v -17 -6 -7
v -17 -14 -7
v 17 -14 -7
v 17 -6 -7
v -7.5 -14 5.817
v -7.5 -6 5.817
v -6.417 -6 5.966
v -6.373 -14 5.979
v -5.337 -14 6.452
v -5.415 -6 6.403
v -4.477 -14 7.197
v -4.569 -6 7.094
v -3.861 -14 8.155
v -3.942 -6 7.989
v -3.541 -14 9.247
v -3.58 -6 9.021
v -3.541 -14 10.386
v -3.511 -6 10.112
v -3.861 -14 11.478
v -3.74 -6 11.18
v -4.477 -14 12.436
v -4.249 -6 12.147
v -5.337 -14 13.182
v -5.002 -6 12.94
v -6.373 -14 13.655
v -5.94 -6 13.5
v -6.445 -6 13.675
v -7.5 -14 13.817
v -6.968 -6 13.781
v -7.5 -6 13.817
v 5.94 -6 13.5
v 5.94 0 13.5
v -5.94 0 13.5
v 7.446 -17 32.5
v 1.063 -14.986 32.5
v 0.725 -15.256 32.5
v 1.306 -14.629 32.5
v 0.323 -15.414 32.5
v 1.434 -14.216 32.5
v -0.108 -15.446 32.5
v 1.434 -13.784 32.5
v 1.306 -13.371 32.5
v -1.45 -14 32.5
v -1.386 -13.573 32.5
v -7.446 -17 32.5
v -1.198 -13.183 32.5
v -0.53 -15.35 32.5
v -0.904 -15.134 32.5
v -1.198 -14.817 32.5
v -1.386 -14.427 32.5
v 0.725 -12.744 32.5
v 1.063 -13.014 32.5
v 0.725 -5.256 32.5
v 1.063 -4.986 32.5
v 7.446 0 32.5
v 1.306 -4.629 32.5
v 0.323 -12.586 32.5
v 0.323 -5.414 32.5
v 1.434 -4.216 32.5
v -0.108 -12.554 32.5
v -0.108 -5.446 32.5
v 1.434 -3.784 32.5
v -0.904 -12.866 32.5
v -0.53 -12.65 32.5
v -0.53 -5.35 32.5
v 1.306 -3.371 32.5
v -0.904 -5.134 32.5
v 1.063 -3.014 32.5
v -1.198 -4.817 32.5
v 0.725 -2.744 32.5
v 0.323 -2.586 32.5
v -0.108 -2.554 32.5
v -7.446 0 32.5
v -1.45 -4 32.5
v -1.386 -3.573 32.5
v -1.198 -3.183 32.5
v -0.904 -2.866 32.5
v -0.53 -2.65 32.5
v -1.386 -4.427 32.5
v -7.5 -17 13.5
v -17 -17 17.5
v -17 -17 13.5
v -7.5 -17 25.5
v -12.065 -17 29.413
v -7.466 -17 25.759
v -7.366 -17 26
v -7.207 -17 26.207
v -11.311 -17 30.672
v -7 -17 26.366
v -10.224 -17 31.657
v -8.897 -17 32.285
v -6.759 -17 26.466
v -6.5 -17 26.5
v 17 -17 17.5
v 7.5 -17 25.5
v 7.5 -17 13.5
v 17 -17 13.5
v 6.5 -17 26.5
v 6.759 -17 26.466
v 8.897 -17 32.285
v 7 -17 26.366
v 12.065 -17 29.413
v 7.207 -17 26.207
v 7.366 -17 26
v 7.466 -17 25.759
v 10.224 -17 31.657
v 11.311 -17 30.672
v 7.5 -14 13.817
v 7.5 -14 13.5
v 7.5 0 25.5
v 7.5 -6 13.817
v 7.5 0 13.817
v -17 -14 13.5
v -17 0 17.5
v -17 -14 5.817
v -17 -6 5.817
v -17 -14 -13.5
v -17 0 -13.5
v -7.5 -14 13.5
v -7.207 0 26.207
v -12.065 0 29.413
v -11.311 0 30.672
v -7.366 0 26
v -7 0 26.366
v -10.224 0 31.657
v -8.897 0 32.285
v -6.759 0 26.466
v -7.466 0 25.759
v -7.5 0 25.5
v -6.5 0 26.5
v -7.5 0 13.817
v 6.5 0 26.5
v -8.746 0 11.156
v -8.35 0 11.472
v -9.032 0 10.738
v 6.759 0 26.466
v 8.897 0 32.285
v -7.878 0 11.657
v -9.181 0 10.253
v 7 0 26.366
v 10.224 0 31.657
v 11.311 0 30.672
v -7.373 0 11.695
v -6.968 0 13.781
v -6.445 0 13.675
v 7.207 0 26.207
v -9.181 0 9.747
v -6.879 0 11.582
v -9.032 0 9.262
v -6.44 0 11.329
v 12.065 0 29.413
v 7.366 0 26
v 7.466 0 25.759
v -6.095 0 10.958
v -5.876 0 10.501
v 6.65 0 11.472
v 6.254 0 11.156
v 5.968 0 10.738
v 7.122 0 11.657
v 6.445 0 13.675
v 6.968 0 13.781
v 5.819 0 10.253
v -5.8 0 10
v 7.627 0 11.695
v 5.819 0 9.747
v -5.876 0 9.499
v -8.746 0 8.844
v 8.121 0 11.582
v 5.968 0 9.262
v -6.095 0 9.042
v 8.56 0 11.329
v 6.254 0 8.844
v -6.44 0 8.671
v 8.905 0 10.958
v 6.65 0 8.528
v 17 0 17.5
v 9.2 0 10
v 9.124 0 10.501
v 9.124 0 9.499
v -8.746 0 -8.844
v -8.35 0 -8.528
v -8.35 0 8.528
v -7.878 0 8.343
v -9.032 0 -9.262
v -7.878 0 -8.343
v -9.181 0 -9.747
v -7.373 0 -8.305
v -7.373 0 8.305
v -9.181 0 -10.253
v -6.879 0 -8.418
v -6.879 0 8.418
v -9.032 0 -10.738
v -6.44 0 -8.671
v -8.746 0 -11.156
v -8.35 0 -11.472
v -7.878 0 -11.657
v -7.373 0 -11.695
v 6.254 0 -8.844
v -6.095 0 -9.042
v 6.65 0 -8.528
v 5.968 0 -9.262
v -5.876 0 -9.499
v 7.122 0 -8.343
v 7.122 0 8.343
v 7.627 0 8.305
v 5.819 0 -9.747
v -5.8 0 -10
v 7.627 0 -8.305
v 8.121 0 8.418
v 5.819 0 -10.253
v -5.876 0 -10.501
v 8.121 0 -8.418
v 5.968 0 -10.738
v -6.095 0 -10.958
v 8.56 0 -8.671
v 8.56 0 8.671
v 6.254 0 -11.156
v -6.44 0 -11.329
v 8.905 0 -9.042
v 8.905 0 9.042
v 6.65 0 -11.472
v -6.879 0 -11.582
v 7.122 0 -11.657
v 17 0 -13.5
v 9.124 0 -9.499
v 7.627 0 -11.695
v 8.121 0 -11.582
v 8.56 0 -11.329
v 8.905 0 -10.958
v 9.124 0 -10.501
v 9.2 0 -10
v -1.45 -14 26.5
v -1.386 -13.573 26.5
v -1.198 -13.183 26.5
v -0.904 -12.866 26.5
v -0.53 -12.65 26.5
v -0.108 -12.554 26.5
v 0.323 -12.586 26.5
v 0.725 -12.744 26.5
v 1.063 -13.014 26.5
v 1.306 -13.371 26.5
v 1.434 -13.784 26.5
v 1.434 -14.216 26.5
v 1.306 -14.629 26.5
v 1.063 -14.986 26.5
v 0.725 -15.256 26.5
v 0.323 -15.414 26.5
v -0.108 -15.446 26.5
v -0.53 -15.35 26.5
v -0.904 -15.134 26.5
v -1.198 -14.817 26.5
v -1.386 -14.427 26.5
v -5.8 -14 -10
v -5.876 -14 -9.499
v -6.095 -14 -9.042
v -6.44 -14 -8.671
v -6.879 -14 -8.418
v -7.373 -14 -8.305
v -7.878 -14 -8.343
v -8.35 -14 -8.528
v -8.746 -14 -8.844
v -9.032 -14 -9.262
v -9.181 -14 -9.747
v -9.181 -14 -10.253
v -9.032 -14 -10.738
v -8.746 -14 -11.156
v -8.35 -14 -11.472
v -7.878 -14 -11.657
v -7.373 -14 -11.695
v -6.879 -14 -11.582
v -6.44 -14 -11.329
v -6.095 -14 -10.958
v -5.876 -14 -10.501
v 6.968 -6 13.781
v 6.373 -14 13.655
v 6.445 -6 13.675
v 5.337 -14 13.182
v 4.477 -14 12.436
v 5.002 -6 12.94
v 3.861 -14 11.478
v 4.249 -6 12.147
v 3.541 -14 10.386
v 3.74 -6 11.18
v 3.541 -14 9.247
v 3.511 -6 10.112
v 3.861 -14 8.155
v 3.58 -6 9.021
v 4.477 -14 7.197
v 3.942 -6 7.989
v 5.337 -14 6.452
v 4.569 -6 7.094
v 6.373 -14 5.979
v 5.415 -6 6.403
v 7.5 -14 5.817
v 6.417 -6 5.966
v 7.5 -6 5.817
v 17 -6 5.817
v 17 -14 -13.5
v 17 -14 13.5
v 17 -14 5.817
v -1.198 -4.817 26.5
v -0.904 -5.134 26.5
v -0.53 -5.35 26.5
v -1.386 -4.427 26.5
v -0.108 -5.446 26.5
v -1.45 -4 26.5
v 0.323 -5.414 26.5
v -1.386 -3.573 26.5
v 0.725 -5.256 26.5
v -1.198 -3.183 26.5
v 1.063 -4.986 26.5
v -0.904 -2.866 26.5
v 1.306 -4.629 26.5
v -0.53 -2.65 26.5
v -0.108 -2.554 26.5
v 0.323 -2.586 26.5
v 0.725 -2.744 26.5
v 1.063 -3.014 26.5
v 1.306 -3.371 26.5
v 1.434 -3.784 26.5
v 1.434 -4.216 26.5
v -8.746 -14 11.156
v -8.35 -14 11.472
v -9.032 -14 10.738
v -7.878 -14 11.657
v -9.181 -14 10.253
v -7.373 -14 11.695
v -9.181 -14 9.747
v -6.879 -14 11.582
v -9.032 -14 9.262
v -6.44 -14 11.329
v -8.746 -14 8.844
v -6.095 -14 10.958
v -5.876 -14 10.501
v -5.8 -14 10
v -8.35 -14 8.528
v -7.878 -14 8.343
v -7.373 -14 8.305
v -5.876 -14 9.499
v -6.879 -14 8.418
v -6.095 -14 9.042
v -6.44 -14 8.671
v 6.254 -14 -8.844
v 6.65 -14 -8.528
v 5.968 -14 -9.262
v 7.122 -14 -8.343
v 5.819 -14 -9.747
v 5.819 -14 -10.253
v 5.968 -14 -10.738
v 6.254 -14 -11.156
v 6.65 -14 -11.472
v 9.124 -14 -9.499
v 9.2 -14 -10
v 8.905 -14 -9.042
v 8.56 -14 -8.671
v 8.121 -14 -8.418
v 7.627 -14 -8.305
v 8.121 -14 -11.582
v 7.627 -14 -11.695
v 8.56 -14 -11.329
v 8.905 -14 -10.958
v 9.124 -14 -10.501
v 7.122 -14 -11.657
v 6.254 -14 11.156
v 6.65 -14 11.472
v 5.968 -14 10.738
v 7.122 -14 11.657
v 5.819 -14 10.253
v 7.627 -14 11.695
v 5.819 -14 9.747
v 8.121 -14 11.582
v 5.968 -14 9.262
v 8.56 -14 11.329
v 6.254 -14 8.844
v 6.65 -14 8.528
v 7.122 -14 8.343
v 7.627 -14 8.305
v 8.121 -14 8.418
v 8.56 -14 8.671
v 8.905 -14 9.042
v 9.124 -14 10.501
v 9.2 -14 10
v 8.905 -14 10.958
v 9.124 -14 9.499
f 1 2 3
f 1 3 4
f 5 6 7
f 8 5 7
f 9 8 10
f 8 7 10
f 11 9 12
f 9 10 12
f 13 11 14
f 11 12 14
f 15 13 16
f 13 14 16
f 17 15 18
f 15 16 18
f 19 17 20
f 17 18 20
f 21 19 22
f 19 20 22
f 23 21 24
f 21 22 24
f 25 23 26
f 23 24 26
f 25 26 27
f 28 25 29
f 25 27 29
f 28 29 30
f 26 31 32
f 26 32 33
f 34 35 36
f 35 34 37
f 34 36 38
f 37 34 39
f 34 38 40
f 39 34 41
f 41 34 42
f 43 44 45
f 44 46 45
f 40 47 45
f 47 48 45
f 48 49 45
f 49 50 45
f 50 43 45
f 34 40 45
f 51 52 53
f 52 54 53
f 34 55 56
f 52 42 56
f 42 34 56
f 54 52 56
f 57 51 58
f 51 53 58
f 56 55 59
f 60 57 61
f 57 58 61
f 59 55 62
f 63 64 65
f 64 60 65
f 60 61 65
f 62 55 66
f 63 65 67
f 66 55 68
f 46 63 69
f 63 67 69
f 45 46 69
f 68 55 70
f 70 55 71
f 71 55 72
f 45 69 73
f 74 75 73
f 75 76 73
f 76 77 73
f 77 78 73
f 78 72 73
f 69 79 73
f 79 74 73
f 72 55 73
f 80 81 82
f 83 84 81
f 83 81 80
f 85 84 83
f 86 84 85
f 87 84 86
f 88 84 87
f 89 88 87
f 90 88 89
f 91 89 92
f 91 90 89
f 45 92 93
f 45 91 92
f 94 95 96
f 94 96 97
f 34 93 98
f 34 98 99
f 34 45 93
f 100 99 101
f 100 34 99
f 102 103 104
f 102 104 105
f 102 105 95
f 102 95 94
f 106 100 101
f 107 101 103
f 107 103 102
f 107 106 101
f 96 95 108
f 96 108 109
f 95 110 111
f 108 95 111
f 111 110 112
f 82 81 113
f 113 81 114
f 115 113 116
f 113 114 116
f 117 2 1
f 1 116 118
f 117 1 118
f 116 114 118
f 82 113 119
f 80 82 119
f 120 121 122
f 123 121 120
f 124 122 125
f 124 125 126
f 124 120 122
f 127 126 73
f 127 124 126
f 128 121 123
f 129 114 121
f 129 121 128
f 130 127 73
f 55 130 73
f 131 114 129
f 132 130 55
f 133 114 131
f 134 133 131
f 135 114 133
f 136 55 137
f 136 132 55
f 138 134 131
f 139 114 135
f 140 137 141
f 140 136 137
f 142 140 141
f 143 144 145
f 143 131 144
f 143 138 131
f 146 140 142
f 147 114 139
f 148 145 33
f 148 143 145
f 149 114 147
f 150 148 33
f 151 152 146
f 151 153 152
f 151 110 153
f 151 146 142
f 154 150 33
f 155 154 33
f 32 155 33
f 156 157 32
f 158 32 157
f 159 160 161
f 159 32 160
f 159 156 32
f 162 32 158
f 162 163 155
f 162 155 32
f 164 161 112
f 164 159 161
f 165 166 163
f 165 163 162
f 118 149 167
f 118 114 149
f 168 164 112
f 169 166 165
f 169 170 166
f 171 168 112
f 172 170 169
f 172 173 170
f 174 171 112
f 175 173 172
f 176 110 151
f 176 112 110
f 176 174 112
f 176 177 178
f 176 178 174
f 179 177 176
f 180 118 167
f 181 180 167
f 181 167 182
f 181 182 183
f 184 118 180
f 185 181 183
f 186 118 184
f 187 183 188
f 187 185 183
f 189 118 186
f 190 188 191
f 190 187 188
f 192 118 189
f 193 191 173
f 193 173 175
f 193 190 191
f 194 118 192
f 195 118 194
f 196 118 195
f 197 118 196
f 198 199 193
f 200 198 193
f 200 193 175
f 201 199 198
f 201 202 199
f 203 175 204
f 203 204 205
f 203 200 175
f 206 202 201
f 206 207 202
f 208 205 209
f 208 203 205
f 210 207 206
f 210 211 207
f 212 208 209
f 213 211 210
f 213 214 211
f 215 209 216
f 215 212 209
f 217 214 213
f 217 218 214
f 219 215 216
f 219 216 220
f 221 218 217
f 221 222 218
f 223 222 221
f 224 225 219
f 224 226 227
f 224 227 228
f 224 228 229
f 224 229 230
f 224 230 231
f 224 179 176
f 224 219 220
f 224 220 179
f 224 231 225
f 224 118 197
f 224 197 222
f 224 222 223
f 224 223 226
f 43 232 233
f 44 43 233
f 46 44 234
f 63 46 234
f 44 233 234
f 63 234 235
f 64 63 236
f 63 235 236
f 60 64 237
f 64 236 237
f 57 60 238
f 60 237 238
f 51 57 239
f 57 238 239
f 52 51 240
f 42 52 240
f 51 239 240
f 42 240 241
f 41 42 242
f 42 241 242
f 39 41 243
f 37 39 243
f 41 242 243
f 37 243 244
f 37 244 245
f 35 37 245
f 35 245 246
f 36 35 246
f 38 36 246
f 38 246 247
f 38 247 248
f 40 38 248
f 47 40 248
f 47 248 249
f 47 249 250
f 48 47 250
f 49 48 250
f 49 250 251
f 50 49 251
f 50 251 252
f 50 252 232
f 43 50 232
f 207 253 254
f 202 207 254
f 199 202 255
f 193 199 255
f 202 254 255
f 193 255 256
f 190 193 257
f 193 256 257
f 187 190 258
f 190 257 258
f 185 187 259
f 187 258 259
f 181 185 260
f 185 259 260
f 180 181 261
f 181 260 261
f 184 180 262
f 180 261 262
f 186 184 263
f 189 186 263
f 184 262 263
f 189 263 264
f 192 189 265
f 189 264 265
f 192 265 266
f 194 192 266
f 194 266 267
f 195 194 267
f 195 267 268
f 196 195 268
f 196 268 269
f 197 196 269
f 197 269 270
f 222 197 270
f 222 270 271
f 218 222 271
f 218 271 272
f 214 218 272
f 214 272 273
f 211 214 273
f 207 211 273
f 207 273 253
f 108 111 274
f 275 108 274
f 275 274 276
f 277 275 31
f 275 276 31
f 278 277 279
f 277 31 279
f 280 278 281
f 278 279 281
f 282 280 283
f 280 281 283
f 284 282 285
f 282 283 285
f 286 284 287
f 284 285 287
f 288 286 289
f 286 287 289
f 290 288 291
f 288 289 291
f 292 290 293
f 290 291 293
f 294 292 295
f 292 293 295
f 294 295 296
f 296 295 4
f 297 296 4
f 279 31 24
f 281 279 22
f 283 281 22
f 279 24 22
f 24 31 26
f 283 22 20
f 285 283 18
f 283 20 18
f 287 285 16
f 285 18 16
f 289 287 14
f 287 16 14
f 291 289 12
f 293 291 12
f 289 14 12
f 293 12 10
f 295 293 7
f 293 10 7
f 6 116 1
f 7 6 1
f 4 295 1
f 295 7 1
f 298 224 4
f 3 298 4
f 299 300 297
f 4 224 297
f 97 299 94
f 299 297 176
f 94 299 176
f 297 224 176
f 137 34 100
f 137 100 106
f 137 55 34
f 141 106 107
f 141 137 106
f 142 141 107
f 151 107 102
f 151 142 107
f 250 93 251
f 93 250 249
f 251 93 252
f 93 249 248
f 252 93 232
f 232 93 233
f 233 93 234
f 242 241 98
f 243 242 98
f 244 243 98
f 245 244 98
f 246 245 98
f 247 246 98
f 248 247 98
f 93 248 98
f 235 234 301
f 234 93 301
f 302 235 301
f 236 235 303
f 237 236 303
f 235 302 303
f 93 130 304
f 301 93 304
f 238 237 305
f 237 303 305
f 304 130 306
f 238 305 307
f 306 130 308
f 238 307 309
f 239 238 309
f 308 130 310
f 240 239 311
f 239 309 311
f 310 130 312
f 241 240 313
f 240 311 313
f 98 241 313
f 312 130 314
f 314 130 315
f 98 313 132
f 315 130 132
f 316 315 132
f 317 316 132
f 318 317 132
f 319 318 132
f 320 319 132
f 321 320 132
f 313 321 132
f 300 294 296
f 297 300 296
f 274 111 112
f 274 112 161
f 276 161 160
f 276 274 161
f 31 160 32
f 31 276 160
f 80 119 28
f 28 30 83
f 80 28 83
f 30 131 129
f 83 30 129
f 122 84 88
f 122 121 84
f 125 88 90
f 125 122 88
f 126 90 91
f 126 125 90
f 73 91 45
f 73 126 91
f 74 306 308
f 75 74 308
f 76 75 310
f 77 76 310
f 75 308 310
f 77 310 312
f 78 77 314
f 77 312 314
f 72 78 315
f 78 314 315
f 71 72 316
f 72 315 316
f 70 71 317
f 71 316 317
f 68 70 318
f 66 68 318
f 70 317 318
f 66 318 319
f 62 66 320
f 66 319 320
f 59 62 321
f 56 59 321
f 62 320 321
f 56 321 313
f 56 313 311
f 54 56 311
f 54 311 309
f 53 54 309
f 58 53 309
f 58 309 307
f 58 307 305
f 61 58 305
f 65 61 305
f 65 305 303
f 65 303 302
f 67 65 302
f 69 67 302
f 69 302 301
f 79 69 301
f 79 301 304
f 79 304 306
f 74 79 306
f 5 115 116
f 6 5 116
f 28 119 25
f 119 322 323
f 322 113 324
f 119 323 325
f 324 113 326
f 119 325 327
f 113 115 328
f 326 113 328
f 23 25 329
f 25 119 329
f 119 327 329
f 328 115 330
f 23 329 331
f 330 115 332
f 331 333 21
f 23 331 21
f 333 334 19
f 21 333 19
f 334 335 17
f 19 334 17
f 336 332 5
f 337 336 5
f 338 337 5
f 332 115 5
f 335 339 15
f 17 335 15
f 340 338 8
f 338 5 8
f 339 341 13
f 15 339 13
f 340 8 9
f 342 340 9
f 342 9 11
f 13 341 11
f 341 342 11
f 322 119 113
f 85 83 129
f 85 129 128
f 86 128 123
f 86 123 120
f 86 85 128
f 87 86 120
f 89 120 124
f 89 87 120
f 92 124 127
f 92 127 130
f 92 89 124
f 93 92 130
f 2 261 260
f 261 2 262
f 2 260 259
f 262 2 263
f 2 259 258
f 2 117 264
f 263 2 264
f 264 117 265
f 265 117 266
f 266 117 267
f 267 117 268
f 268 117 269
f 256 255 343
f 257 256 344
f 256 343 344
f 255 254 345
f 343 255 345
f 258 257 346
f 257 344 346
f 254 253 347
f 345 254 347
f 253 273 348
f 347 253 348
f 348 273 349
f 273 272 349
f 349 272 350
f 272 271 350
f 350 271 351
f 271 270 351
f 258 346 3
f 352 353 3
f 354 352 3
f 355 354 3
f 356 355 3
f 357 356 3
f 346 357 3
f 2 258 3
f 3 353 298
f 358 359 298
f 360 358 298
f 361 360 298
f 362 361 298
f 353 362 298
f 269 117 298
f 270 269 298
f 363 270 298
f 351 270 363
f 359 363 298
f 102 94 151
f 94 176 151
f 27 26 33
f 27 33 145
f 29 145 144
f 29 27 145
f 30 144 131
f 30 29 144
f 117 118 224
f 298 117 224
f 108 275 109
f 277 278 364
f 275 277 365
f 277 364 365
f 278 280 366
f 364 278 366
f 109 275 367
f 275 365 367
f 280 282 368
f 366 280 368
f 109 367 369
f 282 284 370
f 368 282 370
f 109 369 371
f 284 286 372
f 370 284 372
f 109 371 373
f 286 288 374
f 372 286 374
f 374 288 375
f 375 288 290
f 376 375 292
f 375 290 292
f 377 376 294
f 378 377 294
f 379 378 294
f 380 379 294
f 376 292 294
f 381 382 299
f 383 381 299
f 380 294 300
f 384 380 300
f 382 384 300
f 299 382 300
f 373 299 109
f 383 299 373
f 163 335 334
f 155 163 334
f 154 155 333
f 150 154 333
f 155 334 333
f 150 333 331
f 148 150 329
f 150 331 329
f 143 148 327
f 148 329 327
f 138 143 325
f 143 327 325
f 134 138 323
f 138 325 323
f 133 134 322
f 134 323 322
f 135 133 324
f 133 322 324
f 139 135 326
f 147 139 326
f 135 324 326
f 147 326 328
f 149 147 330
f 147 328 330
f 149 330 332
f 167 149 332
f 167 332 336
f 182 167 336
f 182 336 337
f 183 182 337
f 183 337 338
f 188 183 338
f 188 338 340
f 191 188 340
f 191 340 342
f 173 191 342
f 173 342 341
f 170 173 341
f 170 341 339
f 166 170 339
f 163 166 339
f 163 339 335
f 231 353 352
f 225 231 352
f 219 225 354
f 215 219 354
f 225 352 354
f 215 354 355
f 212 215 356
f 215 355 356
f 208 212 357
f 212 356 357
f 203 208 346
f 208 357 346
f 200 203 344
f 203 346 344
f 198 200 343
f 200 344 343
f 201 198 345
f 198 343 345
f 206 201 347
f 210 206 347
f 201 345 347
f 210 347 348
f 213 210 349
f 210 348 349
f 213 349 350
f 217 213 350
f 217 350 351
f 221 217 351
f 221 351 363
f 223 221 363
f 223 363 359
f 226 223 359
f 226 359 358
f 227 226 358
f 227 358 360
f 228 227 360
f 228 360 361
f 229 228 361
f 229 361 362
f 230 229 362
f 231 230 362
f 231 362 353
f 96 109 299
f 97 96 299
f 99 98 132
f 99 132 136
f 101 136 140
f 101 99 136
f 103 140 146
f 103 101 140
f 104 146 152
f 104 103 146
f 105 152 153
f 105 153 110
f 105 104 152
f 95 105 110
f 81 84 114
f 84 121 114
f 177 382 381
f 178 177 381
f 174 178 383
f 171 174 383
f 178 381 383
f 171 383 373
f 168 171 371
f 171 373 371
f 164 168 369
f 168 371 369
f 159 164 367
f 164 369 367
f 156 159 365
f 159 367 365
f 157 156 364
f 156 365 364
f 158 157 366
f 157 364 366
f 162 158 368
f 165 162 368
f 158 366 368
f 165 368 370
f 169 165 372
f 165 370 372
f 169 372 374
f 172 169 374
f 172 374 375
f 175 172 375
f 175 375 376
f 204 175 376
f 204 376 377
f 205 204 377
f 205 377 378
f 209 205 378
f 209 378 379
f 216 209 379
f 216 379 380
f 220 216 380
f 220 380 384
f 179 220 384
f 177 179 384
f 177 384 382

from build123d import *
from OCP.BRepFilletAPI import BRepFilletAPI_MakeChamfer
from build123d.topology import SkipClean

# Parameters (mm, degrees)
SKETCH3_W                  = 34
SKETCH3_H                  = 46
BOSS_EXTRUDE1_DEPTH        = 14
M3_CLEARANCE_HOLE1_D       = 3.4
CUT_EXTRUDE1_DEPTH         = 40.258756985
CUT_EXTRUDE1_DEPTH_BACK    = 40.258756985
SKETCH6_W                  = 12.8166
SKETCH6_H                  = 8
CUT_EXTRUDE2_DEPTH         = 38.539978689
CHAMFER1_SIZE              = 15
CHAMFER1_SIZE2             = 6.213203436
CUT_EXTRUDE3_REACH         = 39.54
BOSS_EXTRUDE2_DEPTH        = 3
FILLET1_R                  = 1
M2_5_CLEARANCE_HOLE1_D     = 2.9
M2_5_CLEARANCE_HOLE1_DEPTH = 6
FILLET2_R                  = 5


with BuildPart() as part:
    # Sketch3 → Boss-Extrude1 (new body)
    with BuildSketch(Plane(origin=(0, 0, 0), x_dir=(1, 0, 0), z_dir=(0, 1, 0))):
        with Locations((0, -9.5)):
            Rectangle(SKETCH3_W, SKETCH3_H)
    extrude(amount=-BOSS_EXTRUDE1_DEPTH)

    # M3 Clearance Hole1 (through all)
    with Locations(Plane(origin=(0, 0, 0), x_dir=(-1, 0, 0), z_dir=(0, 1, 0))):
        with Locations((7.5, 10), (7.5, -10), (-7.5, -10), (-7.5, 10)):
            Hole(M3_CLEARANCE_HOLE1_D / 2)

    # Sketch6 → Cut-Extrude1 (cut, two sides: drawn at the far end of the back side and taken through both)
    with BuildSketch(Plane(origin=(0, 0, 0), x_dir=(0, 0, -1), z_dir=(1, 0, 0)).offset(-CUT_EXTRUDE1_DEPTH_BACK)):
        with Locations((0.5917, -10)):
            Rectangle(SKETCH6_W, SKETCH6_H)
    extrude(amount=CUT_EXTRUDE1_DEPTH + CUT_EXTRUDE1_DEPTH_BACK, mode=Mode.SUBTRACT)

    # Sketch7 → Cut-Extrude2 (cut, through all)
    with BuildSketch(Plane(origin=(0, -6, 0), x_dir=(1, 0, 0), z_dir=(0, 1, 0))):
        with BuildLine():
            Line((-7.5, -26.5), (7.5, -26.5))
            Line((7.5, -26.5), (7.5, -13.8166))
            ThreePointArc((7.5, -13.8166), (3.5, -9.8166), (7.5, -5.8166))
            Line((7.5, -5.8166), (-7.5, -5.8166))
            ThreePointArc((-7.5, -5.8166), (-3.5, -9.8166), (-7.5, -13.8166))
            Line((-7.5, -13.8166), (-7.5, -26.5))
        make_face()
    extrude(amount=-CUT_EXTRUDE2_DEPTH, mode=Mode.SUBTRACT)

    # Chamfer1: one chamfer whose edges measure the first distance from different faces: ONE call of the kernel's chamfer builder (chamfer() names one face for all edges)
    chamfer1_edges_1 = [part.edges().sort_by_distance(p)[0] for p in [
        (17, -7, 32.5),
    ]]
    chamfer1_side_1 = [part.faces().sort_by_distance(p)[0] for p in [
        (17, -6.431916836, 11.410974954),
    ]]
    chamfer1_edges_2 = [part.edges().sort_by_distance(p)[0] for p in [
        (-17, -7, 32.5),
    ]]
    chamfer1_side_2 = [part.faces().sort_by_distance(p)[0] for p in [
        (-17, -6.431916836, 11.410974954),
    ]]
    chamfer1 = BRepFilletAPI_MakeChamfer(part.part.solid().wrapped)
    for e in chamfer1_edges_1:
        chamfer1.Add(CHAMFER1_SIZE, CHAMFER1_SIZE2, e.wrapped, chamfer1_side_1[0].wrapped)  # the first distance lies on this face
    for e in chamfer1_edges_2:
        chamfer1.Add(CHAMFER1_SIZE, CHAMFER1_SIZE2, e.wrapped, chamfer1_side_2[0].wrapped)  # the first distance lies on this face
    add(Compound.cast(chamfer1.Shape()), mode=Mode.REPLACE)

    # Sketch12 → Cut-Extrude3 (cut, up to next)
    with BuildSketch(Plane.XZ.offset(6), mode=Mode.PRIVATE) as cut_extrude3_sk1:
        with BuildLine():
            Line((5.940331946, 13.5), (-5.940331946, 13.5))
            ThreePointArc((-5.940331946, 13.5), (-6.704261349, 13.73665102), (-7.5, 13.8166))
            Line((-7.5, 13.8166), (-7.5, 26.5))
            Line((-7.5, 26.5), (7.5, 26.5))
            Line((7.5, 26.5), (7.5, 13.8166))
            ThreePointArc((7.5, 13.8166), (6.704261349, 13.73665102), (5.940331946, 13.5))
        make_face()
    cut_extrude3_tool1 = extrude(cut_extrude3_sk1.sketch, amount=-CUT_EXTRUDE3_REACH, mode=Mode.PRIVATE) & part.part
    add(cut_extrude3_tool1.solids().sort_by_distance((0, -6, 20.021768))[0], mode=Mode.SUBTRACT)

    # Sketch14 → Boss-Extrude2 (add)
    with SkipClean():  # the faces are left unmerged after this step: merging them gives an invalid solid
        with BuildSketch(Plane.XZ.offset(14)):
            Polygon((-17, 13.5), (-7.5, 13.5), (-7.5, 26.5), (7.5, 26.5), (7.5, 13.5), (17, 13.5), (17, 17.5), (10.786796564, 32.5), (-10.786796564, 32.5), (-17, 17.5), align=None)
        extrude(amount=BOSS_EXTRUDE2_DEPTH)

    # Fillet1
    fillet1_edges = [part.edges().sort_by_distance(p)[0] for p in [
        (-7.5, -10, 26.5),
        (7.5, -10, 26.5),
    ]]
    fillet(fillet1_edges, radius=FILLET1_R)

    # M2.5 Clearance Hole1
    with Locations(Plane.XY.offset(32.5)):
        with Locations((0, -4), (0, -14)):
            Hole(M2_5_CLEARANCE_HOLE1_D / 2, depth=M2_5_CLEARANCE_HOLE1_DEPTH)

    # Fillet2
    fillet2_edges = [part.edges().sort_by_distance(p)[0] for p in [
        (10.786796564, -7, 32.5),
        (-10.786796564, -7, 32.5),
    ]]
    fillet(fillet2_edges, radius=FILLET2_R)


solid = part.part
